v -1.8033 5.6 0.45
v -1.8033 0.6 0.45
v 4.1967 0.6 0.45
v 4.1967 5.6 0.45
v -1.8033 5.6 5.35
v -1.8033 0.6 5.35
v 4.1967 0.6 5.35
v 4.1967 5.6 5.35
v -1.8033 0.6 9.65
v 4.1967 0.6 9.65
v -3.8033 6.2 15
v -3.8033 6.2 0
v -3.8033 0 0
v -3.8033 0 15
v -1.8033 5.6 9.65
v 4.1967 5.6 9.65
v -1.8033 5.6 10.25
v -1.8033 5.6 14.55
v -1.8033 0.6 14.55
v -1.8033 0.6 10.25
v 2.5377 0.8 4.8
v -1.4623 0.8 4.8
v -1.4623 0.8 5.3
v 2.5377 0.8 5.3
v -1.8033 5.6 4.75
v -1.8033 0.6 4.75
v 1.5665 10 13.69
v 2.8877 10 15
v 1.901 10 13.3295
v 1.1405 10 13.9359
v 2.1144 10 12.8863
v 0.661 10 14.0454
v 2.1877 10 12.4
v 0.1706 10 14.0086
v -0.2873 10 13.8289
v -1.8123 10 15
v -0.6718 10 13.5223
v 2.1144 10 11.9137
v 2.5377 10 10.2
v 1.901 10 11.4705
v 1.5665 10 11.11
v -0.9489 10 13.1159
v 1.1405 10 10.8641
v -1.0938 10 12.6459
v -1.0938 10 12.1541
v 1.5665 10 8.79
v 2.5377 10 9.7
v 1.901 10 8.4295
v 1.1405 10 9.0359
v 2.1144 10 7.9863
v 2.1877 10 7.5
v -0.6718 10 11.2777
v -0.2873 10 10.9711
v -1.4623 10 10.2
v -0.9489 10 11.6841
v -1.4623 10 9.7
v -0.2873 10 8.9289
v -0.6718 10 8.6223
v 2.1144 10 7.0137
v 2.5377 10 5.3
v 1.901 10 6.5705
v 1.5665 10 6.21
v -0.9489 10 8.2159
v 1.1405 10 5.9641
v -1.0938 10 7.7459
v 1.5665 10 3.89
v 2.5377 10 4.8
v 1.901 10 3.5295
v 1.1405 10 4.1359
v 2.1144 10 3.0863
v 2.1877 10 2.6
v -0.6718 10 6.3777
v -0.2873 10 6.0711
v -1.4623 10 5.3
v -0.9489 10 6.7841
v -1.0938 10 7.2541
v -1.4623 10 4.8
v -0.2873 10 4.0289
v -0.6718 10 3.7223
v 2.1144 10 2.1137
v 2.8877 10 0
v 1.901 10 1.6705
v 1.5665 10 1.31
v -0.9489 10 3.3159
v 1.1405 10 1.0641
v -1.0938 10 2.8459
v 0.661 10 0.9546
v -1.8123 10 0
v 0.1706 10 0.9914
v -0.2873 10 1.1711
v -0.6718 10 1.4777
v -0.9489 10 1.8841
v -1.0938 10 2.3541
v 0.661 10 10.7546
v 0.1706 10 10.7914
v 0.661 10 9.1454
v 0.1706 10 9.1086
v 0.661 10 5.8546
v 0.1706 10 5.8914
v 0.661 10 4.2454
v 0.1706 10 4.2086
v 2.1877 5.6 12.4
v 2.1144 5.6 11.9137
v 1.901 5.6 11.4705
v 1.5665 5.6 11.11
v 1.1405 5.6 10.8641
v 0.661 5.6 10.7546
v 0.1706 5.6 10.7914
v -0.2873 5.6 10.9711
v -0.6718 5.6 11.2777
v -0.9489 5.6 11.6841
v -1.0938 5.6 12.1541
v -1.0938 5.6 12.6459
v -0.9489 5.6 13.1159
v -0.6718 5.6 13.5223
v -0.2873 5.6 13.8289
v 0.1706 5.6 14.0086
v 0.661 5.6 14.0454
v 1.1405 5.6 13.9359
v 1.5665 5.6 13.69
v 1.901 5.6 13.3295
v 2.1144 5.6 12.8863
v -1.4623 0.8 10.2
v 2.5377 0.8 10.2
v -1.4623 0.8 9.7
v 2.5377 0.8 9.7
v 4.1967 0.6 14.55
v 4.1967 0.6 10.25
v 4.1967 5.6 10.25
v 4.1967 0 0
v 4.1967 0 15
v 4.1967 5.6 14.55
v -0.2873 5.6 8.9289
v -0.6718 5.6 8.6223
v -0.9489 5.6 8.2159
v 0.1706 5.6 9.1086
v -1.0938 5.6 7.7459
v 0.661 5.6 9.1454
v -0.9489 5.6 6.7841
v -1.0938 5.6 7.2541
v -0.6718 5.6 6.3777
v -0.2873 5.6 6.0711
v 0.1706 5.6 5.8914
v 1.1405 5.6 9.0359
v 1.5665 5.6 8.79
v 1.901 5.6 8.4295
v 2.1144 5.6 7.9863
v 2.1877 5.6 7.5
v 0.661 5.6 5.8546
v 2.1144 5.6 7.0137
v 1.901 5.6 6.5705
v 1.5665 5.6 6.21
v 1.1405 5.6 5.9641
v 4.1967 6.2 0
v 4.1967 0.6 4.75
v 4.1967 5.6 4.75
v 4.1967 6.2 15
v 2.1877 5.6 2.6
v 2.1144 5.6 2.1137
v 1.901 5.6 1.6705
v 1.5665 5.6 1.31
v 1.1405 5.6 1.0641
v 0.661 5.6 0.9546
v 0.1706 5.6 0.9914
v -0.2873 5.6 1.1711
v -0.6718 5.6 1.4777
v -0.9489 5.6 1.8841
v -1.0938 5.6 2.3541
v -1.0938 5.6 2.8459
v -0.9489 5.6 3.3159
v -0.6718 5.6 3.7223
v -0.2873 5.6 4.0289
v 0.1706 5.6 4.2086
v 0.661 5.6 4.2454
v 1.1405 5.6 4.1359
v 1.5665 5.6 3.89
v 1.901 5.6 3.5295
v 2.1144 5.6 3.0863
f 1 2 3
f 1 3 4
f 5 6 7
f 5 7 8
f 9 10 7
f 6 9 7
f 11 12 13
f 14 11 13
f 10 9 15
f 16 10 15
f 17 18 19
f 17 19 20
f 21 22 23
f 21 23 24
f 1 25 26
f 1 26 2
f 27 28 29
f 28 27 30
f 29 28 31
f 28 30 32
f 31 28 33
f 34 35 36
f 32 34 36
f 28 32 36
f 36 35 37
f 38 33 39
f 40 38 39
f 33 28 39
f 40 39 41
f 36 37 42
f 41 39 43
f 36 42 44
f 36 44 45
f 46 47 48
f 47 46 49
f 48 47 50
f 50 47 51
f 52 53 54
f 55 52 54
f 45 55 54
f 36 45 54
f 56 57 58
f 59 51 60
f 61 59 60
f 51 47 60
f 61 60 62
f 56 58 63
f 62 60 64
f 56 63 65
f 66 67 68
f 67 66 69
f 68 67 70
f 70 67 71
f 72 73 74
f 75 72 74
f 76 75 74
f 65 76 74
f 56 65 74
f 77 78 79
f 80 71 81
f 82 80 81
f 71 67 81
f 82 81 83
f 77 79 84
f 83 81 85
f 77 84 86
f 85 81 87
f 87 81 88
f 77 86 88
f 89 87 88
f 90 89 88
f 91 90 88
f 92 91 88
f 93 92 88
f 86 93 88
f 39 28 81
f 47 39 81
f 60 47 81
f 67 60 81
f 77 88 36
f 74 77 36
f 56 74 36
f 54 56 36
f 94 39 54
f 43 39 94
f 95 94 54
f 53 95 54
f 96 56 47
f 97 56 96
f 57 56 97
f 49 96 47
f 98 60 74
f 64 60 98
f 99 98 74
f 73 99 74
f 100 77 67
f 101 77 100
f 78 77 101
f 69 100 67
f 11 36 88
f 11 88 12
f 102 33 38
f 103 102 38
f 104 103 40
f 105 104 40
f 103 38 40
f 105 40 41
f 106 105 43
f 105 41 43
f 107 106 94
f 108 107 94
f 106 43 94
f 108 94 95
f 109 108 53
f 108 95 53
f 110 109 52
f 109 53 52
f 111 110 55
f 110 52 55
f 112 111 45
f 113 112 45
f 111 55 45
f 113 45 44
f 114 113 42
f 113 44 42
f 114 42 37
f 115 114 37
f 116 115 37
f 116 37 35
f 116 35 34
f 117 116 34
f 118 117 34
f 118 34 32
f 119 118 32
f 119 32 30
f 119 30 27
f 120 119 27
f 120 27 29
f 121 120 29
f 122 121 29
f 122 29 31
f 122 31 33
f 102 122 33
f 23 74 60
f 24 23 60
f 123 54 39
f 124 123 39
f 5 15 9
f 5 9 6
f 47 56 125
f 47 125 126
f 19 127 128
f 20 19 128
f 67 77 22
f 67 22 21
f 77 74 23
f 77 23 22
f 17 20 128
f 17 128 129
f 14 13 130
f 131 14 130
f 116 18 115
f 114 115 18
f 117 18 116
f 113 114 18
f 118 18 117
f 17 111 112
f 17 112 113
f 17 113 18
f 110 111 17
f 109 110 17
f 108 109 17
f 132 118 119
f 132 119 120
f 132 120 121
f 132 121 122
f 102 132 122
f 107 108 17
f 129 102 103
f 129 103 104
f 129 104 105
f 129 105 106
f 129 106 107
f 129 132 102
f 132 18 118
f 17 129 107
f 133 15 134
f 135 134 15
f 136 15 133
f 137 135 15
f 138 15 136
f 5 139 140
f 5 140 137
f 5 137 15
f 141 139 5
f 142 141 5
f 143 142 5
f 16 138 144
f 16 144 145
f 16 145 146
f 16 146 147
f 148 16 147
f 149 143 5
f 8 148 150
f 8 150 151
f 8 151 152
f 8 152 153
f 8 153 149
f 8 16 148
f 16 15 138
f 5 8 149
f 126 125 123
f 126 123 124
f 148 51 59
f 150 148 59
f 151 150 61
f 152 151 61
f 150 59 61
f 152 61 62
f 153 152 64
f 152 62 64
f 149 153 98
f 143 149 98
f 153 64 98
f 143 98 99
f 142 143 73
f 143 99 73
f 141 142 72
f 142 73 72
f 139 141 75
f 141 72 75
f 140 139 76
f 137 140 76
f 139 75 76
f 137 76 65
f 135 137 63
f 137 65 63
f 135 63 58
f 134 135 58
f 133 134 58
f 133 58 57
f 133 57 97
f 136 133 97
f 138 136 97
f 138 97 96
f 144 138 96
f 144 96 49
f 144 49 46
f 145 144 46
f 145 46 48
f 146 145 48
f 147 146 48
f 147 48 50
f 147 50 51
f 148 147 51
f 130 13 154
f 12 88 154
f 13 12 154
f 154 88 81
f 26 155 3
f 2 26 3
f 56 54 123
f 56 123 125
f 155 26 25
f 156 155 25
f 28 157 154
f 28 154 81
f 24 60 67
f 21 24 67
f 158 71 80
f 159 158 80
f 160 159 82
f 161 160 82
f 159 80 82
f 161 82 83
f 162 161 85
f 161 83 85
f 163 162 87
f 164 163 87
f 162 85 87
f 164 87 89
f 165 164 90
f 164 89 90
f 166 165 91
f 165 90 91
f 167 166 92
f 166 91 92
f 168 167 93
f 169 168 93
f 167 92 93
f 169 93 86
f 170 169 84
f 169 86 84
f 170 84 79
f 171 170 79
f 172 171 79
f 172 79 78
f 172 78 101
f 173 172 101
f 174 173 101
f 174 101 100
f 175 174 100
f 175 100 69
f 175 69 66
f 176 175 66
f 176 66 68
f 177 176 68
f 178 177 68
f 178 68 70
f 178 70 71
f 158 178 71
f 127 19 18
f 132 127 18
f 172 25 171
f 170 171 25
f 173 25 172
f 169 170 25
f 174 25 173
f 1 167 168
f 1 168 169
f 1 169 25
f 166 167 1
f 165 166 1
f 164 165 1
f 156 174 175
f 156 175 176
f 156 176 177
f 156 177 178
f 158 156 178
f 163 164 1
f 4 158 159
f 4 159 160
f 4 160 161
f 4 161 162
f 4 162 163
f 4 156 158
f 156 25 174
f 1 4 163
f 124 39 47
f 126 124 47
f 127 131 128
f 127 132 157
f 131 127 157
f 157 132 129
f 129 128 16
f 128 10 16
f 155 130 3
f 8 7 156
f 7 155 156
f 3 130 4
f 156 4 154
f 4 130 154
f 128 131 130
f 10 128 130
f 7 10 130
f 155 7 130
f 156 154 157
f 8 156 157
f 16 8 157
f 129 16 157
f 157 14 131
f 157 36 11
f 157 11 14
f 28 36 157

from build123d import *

# Parameters (mm, degrees)
BOSS_EXTRUDE1_DEPTH = 15
SKETCH2_R           = 1.65
SKETCH2_W           = 4
SKETCH2_H           = 0.5
CUT_EXTRUDE1_DEPTH  = 9.2
SKETCH3_W           = 4.3
SKETCH3_H           = 5
CUT_EXTRUDE2_DEPTH  = 6


with BuildPart() as part:
    # Sketch1 → Boss-Extrude1 (new body)
    with BuildSketch(Plane.XY):
        Polygon((-3.803278689, 0), (4.196721311, 0), (4.196721311, 6.2), (2.887726083, 10), (-1.812273917, 10), (-3.803278689, 6.2), align=None)
    extrude(amount=BOSS_EXTRUDE1_DEPTH)

    # Sketch2 → Cut-Extrude1 (cut)
    with BuildSketch(Plane(origin=(0, 10, 0), x_dir=(1, 0, 0), z_dir=(0, 1, 0))):
        with Locations((0.537726083, -12.4)):
            Circle(SKETCH2_R)
        with Locations((0.537726083, -7.5)):
            Circle(SKETCH2_R)
        with Locations((0.537726083, -2.6)):
            Circle(SKETCH2_R)
        with Locations((0.537726083, -9.95)):
            Rectangle(SKETCH2_W, SKETCH2_H)
        with Locations((0.537726083, -5.05)):
            Rectangle(SKETCH2_W, SKETCH2_H)
    extrude(amount=-CUT_EXTRUDE1_DEPTH, mode=Mode.SUBTRACT)

    # Sketch3 → Cut-Extrude2 (cut)
    with BuildSketch(Plane(origin=(4.196721311, 0, 0), x_dir=(0, 0, -1), z_dir=(1, 0, 0))):
        with Locations((-12.4, 3.1)):
            Rectangle(SKETCH3_W, SKETCH3_H)
        with Locations((-7.5, 3.1)):
            Rectangle(SKETCH3_W, SKETCH3_H)
        with Locations((-2.6, 3.1)):
            Rectangle(SKETCH3_W, SKETCH3_H)
    extrude(amount=-CUT_EXTRUDE2_DEPTH, mode=Mode.SUBTRACT)


solid = part.part
